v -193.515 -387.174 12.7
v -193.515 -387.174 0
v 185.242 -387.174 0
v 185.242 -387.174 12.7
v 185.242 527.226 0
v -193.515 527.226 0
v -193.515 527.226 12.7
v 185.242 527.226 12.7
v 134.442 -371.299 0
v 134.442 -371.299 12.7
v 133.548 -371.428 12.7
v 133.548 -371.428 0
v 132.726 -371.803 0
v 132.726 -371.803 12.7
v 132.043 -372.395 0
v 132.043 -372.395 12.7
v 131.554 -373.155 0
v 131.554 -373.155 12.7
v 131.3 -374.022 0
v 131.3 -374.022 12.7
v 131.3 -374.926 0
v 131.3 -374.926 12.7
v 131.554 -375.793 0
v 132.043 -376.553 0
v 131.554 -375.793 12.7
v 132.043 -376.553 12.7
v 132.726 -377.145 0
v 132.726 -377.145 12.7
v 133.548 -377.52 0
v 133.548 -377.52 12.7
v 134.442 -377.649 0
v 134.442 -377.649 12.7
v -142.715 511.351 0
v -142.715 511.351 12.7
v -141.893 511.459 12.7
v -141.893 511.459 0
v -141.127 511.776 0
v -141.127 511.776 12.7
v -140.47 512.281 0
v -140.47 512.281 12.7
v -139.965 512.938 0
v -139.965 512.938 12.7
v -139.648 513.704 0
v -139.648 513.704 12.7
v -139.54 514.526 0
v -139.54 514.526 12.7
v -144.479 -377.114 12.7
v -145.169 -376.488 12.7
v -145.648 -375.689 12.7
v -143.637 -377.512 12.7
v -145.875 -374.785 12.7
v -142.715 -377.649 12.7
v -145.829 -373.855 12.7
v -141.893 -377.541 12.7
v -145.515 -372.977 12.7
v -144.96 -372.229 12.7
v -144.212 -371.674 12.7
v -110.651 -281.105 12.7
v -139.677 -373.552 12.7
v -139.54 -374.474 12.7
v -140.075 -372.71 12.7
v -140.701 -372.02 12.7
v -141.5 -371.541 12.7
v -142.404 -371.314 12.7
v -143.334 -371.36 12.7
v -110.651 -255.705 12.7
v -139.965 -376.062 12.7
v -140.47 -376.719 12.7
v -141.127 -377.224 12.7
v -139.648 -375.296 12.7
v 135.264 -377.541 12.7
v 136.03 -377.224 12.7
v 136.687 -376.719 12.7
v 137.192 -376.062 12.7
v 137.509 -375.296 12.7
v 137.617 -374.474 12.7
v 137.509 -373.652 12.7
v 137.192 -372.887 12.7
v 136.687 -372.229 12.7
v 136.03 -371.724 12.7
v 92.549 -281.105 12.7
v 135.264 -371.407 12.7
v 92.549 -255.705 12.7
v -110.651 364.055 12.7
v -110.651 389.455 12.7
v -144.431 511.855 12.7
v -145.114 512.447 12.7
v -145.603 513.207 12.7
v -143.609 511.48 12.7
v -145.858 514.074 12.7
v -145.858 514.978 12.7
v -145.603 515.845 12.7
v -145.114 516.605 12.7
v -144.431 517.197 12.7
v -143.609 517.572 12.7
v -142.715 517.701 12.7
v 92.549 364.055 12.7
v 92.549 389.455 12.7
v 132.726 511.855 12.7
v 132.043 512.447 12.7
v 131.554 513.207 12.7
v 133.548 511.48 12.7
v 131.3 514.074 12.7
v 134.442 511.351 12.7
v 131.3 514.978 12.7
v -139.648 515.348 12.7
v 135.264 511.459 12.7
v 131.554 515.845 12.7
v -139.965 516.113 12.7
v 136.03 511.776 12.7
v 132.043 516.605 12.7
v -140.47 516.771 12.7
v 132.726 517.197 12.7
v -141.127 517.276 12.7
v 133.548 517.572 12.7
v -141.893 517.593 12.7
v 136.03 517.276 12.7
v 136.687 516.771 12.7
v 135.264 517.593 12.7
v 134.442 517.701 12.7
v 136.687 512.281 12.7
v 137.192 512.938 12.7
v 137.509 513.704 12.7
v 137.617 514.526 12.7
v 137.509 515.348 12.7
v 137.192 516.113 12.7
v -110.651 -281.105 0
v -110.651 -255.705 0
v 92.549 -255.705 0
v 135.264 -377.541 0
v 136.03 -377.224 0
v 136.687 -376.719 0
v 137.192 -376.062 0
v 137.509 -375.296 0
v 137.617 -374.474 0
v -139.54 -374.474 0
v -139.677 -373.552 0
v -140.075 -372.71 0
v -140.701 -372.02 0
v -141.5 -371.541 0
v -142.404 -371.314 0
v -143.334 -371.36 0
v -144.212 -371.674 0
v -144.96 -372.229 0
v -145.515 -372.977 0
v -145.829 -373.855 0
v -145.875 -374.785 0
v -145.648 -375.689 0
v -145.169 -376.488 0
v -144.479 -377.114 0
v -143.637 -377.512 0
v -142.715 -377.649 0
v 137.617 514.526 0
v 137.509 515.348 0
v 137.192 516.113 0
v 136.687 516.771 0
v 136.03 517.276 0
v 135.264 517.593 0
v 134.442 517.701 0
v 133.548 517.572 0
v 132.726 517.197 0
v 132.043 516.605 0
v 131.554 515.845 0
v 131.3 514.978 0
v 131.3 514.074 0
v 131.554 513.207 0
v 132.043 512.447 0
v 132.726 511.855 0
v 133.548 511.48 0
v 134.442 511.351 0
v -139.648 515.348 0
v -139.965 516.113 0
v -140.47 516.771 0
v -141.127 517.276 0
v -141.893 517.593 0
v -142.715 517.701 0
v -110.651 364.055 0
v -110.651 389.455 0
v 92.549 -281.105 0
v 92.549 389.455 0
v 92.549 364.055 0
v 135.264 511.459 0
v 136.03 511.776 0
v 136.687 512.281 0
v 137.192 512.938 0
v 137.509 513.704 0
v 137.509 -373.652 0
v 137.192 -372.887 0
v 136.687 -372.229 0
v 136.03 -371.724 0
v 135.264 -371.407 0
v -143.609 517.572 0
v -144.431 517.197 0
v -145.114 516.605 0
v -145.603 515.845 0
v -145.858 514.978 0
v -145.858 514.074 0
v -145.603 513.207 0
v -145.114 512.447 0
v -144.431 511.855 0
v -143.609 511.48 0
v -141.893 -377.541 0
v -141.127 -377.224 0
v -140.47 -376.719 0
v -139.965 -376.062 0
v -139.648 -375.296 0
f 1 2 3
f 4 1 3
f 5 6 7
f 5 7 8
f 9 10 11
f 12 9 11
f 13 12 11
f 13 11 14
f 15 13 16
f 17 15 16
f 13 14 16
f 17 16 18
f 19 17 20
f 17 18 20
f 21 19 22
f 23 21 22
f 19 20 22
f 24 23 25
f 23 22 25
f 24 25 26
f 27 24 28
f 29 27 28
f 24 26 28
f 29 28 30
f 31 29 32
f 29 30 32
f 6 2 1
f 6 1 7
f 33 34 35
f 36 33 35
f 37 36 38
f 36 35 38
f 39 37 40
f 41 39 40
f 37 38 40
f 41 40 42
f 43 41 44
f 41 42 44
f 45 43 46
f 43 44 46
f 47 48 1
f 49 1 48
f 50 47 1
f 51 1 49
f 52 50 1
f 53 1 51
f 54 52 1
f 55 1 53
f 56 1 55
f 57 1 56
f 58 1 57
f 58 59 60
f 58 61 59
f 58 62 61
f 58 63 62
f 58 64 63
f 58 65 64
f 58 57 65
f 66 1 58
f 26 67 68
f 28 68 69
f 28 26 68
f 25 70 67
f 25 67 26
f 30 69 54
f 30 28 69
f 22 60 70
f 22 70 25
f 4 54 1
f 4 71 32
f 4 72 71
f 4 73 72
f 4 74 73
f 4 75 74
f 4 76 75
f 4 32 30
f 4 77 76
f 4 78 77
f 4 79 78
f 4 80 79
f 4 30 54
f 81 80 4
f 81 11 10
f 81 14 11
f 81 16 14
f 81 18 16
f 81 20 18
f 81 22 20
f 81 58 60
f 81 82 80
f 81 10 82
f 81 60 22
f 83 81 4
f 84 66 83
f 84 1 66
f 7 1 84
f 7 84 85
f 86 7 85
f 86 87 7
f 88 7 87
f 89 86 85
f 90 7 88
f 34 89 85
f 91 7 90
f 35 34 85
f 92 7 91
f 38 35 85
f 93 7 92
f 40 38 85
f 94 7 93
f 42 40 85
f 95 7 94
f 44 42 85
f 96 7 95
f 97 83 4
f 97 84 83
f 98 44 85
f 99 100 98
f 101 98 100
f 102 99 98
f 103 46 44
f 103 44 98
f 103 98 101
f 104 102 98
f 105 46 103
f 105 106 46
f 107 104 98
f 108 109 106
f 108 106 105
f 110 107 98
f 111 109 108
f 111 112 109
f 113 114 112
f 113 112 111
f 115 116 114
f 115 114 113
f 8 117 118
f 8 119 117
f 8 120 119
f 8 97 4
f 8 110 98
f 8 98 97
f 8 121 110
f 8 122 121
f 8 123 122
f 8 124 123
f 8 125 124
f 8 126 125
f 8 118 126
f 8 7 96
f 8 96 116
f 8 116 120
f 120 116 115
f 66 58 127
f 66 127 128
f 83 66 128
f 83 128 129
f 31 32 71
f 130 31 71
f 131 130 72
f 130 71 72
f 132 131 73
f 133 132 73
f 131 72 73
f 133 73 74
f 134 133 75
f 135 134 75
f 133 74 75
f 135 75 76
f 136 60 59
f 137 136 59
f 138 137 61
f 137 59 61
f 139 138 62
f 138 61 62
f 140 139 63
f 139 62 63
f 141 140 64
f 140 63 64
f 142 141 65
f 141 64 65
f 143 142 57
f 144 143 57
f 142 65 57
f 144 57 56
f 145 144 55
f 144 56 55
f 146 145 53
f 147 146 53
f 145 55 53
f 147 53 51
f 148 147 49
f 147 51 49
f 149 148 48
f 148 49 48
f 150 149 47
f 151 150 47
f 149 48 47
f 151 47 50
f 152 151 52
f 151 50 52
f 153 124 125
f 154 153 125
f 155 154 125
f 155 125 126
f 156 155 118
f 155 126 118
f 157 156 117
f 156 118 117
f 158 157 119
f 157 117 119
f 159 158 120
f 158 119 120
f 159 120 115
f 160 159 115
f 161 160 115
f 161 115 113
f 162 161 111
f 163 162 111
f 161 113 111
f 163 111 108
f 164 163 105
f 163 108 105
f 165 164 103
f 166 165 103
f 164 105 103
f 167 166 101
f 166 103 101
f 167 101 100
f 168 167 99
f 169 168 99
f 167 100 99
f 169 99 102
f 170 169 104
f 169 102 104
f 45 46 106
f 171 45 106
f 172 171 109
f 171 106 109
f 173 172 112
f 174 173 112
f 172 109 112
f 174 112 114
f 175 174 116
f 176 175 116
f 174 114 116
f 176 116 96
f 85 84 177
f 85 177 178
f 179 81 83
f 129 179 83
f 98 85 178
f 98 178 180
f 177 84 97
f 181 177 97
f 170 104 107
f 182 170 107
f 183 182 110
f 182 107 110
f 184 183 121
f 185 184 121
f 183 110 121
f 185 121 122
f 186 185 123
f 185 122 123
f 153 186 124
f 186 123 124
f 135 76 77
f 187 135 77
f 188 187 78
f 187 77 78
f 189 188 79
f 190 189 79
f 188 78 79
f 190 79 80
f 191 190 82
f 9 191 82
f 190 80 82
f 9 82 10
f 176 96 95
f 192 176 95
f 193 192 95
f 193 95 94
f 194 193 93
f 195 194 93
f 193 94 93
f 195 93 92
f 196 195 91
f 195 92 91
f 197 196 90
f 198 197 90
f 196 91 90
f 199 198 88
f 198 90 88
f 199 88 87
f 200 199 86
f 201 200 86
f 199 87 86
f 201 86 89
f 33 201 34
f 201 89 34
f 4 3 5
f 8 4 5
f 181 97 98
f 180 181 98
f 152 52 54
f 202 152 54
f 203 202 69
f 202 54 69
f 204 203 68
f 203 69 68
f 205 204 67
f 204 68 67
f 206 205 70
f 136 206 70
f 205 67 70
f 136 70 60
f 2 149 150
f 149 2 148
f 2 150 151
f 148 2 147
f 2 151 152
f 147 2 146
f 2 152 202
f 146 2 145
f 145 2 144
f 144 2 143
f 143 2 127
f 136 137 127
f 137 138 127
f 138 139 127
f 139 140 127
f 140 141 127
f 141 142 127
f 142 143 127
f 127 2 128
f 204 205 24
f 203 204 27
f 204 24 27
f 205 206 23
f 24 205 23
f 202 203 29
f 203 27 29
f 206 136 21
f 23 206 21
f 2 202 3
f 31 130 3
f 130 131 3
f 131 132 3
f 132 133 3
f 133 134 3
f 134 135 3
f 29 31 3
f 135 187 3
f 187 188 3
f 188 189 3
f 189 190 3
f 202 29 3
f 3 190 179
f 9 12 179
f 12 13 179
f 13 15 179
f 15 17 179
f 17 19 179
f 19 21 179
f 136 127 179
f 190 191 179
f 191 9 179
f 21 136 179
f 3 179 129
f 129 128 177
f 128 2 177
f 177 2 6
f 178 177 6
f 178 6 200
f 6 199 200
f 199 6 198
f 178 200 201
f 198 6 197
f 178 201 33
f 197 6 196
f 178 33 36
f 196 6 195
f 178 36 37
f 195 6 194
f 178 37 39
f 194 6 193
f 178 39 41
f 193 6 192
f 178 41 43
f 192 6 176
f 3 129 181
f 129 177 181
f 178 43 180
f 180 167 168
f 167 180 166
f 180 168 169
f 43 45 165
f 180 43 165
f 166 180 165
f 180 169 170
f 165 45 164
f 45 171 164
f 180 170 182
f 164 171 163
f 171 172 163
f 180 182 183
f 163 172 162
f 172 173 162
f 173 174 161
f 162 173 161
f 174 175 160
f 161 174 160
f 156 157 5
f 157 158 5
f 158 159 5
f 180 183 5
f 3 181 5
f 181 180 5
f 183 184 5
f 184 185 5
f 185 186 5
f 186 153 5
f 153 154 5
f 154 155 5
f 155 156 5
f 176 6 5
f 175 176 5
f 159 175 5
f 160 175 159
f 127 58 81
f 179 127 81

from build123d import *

# Parameters (mm, degrees)
F0_W     = 378.75718
F0_H     = 914.4
F1_DEPTH = 12.7
F3_DEPTH = 12.701
F4_W     = 203.2
F4_H     = 25.4
F5_DEPTH = 25.4


with BuildPart() as f1:
    # F0 (on Top) → F1 (new body)
    with BuildSketch(Plane.XY):
        with Locations((-4.136321, 70.025934)):
            Rectangle(F0_W, F0_H)
    extrude(amount=F1_DEPTH)

    # F2 (on face) → F3 (cut, through all)
    with BuildSketch(Plane.XY.offset(12.7)):
        with BuildLine():
            Line((-142.714911, 514.525934), (-142.714911, 511.350934))
            ThreePointArc((-142.714911, 511.350934), (-140.469847, 512.28087), (-139.539911, 514.525934))
            ThreePointArc((-139.539911, 514.525934), (-140.469847, 516.770998), (-142.714911, 517.700934))
            Line((-142.714911, 517.700934), (-142.714911, 514.525934))
        make_face()
        with BuildLine():
            ThreePointArc((-142.714911, 517.700934), (-145.889911, 514.525934), (-142.714911, 511.350934))
            Line((-142.714911, 511.350934), (-142.714911, 514.525934))
            Line((-142.714911, 514.525934), (-142.714911, 517.700934))
        make_face()
        with BuildLine():
            Line((134.442269, 514.525934), (134.442269, 511.350934))
            ThreePointArc((134.442269, 511.350934), (136.687333, 512.28087), (137.617269, 514.525934))
            ThreePointArc((137.617269, 514.525934), (136.687333, 516.770998), (134.442269, 517.700934))
            Line((134.442269, 517.700934), (134.442269, 514.525934))
        make_face()
        with BuildLine():
            ThreePointArc((134.442269, 517.700934), (131.267269, 514.525934), (134.442269, 511.350934))
            Line((134.442269, 511.350934), (134.442269, 514.525934))
            Line((134.442269, 514.525934), (134.442269, 517.700934))
        make_face()
        with BuildLine():
            ThreePointArc((-142.714911, -377.649066), (-140.469847, -376.71913), (-139.539911, -374.474066))
            ThreePointArc((-139.539911, -374.474066), (-144.959975, -372.229002), (-142.714911, -377.649066))
        make_face()
        with BuildLine():
            ThreePointArc((134.442269, -377.649066), (136.687333, -376.71913), (137.617269, -374.474066))
            ThreePointArc((137.617269, -374.474066), (136.687333, -372.229002), (134.442269, -371.299066))
            Line((134.442269, -371.299066), (134.442269, -374.474066))
            Line((134.442269, -374.474066), (134.442269, -377.649066))
        make_face()
        with BuildLine():
            Line((134.442269, -374.474066), (134.442269, -371.299066))
            ThreePointArc((134.442269, -371.299066), (131.267269, -374.474066), (134.442269, -377.649066))
            Line((134.442269, -377.649066), (134.442269, -374.474066))
        make_face()
    extrude(amount=-F3_DEPTH, mode=Mode.SUBTRACT)

    # F4 (on face) → F5 (cut)
    with BuildSketch(Plane.XY.offset(12.7)):
        with Locations((-9.051421, 376.754831)):
            Rectangle(F4_W, F4_H)
        with Locations((-9.051421, -268.405143)):
            Rectangle(F4_W, F4_H)
    extrude(amount=-F5_DEPTH, mode=Mode.SUBTRACT)


solid = f1.part
